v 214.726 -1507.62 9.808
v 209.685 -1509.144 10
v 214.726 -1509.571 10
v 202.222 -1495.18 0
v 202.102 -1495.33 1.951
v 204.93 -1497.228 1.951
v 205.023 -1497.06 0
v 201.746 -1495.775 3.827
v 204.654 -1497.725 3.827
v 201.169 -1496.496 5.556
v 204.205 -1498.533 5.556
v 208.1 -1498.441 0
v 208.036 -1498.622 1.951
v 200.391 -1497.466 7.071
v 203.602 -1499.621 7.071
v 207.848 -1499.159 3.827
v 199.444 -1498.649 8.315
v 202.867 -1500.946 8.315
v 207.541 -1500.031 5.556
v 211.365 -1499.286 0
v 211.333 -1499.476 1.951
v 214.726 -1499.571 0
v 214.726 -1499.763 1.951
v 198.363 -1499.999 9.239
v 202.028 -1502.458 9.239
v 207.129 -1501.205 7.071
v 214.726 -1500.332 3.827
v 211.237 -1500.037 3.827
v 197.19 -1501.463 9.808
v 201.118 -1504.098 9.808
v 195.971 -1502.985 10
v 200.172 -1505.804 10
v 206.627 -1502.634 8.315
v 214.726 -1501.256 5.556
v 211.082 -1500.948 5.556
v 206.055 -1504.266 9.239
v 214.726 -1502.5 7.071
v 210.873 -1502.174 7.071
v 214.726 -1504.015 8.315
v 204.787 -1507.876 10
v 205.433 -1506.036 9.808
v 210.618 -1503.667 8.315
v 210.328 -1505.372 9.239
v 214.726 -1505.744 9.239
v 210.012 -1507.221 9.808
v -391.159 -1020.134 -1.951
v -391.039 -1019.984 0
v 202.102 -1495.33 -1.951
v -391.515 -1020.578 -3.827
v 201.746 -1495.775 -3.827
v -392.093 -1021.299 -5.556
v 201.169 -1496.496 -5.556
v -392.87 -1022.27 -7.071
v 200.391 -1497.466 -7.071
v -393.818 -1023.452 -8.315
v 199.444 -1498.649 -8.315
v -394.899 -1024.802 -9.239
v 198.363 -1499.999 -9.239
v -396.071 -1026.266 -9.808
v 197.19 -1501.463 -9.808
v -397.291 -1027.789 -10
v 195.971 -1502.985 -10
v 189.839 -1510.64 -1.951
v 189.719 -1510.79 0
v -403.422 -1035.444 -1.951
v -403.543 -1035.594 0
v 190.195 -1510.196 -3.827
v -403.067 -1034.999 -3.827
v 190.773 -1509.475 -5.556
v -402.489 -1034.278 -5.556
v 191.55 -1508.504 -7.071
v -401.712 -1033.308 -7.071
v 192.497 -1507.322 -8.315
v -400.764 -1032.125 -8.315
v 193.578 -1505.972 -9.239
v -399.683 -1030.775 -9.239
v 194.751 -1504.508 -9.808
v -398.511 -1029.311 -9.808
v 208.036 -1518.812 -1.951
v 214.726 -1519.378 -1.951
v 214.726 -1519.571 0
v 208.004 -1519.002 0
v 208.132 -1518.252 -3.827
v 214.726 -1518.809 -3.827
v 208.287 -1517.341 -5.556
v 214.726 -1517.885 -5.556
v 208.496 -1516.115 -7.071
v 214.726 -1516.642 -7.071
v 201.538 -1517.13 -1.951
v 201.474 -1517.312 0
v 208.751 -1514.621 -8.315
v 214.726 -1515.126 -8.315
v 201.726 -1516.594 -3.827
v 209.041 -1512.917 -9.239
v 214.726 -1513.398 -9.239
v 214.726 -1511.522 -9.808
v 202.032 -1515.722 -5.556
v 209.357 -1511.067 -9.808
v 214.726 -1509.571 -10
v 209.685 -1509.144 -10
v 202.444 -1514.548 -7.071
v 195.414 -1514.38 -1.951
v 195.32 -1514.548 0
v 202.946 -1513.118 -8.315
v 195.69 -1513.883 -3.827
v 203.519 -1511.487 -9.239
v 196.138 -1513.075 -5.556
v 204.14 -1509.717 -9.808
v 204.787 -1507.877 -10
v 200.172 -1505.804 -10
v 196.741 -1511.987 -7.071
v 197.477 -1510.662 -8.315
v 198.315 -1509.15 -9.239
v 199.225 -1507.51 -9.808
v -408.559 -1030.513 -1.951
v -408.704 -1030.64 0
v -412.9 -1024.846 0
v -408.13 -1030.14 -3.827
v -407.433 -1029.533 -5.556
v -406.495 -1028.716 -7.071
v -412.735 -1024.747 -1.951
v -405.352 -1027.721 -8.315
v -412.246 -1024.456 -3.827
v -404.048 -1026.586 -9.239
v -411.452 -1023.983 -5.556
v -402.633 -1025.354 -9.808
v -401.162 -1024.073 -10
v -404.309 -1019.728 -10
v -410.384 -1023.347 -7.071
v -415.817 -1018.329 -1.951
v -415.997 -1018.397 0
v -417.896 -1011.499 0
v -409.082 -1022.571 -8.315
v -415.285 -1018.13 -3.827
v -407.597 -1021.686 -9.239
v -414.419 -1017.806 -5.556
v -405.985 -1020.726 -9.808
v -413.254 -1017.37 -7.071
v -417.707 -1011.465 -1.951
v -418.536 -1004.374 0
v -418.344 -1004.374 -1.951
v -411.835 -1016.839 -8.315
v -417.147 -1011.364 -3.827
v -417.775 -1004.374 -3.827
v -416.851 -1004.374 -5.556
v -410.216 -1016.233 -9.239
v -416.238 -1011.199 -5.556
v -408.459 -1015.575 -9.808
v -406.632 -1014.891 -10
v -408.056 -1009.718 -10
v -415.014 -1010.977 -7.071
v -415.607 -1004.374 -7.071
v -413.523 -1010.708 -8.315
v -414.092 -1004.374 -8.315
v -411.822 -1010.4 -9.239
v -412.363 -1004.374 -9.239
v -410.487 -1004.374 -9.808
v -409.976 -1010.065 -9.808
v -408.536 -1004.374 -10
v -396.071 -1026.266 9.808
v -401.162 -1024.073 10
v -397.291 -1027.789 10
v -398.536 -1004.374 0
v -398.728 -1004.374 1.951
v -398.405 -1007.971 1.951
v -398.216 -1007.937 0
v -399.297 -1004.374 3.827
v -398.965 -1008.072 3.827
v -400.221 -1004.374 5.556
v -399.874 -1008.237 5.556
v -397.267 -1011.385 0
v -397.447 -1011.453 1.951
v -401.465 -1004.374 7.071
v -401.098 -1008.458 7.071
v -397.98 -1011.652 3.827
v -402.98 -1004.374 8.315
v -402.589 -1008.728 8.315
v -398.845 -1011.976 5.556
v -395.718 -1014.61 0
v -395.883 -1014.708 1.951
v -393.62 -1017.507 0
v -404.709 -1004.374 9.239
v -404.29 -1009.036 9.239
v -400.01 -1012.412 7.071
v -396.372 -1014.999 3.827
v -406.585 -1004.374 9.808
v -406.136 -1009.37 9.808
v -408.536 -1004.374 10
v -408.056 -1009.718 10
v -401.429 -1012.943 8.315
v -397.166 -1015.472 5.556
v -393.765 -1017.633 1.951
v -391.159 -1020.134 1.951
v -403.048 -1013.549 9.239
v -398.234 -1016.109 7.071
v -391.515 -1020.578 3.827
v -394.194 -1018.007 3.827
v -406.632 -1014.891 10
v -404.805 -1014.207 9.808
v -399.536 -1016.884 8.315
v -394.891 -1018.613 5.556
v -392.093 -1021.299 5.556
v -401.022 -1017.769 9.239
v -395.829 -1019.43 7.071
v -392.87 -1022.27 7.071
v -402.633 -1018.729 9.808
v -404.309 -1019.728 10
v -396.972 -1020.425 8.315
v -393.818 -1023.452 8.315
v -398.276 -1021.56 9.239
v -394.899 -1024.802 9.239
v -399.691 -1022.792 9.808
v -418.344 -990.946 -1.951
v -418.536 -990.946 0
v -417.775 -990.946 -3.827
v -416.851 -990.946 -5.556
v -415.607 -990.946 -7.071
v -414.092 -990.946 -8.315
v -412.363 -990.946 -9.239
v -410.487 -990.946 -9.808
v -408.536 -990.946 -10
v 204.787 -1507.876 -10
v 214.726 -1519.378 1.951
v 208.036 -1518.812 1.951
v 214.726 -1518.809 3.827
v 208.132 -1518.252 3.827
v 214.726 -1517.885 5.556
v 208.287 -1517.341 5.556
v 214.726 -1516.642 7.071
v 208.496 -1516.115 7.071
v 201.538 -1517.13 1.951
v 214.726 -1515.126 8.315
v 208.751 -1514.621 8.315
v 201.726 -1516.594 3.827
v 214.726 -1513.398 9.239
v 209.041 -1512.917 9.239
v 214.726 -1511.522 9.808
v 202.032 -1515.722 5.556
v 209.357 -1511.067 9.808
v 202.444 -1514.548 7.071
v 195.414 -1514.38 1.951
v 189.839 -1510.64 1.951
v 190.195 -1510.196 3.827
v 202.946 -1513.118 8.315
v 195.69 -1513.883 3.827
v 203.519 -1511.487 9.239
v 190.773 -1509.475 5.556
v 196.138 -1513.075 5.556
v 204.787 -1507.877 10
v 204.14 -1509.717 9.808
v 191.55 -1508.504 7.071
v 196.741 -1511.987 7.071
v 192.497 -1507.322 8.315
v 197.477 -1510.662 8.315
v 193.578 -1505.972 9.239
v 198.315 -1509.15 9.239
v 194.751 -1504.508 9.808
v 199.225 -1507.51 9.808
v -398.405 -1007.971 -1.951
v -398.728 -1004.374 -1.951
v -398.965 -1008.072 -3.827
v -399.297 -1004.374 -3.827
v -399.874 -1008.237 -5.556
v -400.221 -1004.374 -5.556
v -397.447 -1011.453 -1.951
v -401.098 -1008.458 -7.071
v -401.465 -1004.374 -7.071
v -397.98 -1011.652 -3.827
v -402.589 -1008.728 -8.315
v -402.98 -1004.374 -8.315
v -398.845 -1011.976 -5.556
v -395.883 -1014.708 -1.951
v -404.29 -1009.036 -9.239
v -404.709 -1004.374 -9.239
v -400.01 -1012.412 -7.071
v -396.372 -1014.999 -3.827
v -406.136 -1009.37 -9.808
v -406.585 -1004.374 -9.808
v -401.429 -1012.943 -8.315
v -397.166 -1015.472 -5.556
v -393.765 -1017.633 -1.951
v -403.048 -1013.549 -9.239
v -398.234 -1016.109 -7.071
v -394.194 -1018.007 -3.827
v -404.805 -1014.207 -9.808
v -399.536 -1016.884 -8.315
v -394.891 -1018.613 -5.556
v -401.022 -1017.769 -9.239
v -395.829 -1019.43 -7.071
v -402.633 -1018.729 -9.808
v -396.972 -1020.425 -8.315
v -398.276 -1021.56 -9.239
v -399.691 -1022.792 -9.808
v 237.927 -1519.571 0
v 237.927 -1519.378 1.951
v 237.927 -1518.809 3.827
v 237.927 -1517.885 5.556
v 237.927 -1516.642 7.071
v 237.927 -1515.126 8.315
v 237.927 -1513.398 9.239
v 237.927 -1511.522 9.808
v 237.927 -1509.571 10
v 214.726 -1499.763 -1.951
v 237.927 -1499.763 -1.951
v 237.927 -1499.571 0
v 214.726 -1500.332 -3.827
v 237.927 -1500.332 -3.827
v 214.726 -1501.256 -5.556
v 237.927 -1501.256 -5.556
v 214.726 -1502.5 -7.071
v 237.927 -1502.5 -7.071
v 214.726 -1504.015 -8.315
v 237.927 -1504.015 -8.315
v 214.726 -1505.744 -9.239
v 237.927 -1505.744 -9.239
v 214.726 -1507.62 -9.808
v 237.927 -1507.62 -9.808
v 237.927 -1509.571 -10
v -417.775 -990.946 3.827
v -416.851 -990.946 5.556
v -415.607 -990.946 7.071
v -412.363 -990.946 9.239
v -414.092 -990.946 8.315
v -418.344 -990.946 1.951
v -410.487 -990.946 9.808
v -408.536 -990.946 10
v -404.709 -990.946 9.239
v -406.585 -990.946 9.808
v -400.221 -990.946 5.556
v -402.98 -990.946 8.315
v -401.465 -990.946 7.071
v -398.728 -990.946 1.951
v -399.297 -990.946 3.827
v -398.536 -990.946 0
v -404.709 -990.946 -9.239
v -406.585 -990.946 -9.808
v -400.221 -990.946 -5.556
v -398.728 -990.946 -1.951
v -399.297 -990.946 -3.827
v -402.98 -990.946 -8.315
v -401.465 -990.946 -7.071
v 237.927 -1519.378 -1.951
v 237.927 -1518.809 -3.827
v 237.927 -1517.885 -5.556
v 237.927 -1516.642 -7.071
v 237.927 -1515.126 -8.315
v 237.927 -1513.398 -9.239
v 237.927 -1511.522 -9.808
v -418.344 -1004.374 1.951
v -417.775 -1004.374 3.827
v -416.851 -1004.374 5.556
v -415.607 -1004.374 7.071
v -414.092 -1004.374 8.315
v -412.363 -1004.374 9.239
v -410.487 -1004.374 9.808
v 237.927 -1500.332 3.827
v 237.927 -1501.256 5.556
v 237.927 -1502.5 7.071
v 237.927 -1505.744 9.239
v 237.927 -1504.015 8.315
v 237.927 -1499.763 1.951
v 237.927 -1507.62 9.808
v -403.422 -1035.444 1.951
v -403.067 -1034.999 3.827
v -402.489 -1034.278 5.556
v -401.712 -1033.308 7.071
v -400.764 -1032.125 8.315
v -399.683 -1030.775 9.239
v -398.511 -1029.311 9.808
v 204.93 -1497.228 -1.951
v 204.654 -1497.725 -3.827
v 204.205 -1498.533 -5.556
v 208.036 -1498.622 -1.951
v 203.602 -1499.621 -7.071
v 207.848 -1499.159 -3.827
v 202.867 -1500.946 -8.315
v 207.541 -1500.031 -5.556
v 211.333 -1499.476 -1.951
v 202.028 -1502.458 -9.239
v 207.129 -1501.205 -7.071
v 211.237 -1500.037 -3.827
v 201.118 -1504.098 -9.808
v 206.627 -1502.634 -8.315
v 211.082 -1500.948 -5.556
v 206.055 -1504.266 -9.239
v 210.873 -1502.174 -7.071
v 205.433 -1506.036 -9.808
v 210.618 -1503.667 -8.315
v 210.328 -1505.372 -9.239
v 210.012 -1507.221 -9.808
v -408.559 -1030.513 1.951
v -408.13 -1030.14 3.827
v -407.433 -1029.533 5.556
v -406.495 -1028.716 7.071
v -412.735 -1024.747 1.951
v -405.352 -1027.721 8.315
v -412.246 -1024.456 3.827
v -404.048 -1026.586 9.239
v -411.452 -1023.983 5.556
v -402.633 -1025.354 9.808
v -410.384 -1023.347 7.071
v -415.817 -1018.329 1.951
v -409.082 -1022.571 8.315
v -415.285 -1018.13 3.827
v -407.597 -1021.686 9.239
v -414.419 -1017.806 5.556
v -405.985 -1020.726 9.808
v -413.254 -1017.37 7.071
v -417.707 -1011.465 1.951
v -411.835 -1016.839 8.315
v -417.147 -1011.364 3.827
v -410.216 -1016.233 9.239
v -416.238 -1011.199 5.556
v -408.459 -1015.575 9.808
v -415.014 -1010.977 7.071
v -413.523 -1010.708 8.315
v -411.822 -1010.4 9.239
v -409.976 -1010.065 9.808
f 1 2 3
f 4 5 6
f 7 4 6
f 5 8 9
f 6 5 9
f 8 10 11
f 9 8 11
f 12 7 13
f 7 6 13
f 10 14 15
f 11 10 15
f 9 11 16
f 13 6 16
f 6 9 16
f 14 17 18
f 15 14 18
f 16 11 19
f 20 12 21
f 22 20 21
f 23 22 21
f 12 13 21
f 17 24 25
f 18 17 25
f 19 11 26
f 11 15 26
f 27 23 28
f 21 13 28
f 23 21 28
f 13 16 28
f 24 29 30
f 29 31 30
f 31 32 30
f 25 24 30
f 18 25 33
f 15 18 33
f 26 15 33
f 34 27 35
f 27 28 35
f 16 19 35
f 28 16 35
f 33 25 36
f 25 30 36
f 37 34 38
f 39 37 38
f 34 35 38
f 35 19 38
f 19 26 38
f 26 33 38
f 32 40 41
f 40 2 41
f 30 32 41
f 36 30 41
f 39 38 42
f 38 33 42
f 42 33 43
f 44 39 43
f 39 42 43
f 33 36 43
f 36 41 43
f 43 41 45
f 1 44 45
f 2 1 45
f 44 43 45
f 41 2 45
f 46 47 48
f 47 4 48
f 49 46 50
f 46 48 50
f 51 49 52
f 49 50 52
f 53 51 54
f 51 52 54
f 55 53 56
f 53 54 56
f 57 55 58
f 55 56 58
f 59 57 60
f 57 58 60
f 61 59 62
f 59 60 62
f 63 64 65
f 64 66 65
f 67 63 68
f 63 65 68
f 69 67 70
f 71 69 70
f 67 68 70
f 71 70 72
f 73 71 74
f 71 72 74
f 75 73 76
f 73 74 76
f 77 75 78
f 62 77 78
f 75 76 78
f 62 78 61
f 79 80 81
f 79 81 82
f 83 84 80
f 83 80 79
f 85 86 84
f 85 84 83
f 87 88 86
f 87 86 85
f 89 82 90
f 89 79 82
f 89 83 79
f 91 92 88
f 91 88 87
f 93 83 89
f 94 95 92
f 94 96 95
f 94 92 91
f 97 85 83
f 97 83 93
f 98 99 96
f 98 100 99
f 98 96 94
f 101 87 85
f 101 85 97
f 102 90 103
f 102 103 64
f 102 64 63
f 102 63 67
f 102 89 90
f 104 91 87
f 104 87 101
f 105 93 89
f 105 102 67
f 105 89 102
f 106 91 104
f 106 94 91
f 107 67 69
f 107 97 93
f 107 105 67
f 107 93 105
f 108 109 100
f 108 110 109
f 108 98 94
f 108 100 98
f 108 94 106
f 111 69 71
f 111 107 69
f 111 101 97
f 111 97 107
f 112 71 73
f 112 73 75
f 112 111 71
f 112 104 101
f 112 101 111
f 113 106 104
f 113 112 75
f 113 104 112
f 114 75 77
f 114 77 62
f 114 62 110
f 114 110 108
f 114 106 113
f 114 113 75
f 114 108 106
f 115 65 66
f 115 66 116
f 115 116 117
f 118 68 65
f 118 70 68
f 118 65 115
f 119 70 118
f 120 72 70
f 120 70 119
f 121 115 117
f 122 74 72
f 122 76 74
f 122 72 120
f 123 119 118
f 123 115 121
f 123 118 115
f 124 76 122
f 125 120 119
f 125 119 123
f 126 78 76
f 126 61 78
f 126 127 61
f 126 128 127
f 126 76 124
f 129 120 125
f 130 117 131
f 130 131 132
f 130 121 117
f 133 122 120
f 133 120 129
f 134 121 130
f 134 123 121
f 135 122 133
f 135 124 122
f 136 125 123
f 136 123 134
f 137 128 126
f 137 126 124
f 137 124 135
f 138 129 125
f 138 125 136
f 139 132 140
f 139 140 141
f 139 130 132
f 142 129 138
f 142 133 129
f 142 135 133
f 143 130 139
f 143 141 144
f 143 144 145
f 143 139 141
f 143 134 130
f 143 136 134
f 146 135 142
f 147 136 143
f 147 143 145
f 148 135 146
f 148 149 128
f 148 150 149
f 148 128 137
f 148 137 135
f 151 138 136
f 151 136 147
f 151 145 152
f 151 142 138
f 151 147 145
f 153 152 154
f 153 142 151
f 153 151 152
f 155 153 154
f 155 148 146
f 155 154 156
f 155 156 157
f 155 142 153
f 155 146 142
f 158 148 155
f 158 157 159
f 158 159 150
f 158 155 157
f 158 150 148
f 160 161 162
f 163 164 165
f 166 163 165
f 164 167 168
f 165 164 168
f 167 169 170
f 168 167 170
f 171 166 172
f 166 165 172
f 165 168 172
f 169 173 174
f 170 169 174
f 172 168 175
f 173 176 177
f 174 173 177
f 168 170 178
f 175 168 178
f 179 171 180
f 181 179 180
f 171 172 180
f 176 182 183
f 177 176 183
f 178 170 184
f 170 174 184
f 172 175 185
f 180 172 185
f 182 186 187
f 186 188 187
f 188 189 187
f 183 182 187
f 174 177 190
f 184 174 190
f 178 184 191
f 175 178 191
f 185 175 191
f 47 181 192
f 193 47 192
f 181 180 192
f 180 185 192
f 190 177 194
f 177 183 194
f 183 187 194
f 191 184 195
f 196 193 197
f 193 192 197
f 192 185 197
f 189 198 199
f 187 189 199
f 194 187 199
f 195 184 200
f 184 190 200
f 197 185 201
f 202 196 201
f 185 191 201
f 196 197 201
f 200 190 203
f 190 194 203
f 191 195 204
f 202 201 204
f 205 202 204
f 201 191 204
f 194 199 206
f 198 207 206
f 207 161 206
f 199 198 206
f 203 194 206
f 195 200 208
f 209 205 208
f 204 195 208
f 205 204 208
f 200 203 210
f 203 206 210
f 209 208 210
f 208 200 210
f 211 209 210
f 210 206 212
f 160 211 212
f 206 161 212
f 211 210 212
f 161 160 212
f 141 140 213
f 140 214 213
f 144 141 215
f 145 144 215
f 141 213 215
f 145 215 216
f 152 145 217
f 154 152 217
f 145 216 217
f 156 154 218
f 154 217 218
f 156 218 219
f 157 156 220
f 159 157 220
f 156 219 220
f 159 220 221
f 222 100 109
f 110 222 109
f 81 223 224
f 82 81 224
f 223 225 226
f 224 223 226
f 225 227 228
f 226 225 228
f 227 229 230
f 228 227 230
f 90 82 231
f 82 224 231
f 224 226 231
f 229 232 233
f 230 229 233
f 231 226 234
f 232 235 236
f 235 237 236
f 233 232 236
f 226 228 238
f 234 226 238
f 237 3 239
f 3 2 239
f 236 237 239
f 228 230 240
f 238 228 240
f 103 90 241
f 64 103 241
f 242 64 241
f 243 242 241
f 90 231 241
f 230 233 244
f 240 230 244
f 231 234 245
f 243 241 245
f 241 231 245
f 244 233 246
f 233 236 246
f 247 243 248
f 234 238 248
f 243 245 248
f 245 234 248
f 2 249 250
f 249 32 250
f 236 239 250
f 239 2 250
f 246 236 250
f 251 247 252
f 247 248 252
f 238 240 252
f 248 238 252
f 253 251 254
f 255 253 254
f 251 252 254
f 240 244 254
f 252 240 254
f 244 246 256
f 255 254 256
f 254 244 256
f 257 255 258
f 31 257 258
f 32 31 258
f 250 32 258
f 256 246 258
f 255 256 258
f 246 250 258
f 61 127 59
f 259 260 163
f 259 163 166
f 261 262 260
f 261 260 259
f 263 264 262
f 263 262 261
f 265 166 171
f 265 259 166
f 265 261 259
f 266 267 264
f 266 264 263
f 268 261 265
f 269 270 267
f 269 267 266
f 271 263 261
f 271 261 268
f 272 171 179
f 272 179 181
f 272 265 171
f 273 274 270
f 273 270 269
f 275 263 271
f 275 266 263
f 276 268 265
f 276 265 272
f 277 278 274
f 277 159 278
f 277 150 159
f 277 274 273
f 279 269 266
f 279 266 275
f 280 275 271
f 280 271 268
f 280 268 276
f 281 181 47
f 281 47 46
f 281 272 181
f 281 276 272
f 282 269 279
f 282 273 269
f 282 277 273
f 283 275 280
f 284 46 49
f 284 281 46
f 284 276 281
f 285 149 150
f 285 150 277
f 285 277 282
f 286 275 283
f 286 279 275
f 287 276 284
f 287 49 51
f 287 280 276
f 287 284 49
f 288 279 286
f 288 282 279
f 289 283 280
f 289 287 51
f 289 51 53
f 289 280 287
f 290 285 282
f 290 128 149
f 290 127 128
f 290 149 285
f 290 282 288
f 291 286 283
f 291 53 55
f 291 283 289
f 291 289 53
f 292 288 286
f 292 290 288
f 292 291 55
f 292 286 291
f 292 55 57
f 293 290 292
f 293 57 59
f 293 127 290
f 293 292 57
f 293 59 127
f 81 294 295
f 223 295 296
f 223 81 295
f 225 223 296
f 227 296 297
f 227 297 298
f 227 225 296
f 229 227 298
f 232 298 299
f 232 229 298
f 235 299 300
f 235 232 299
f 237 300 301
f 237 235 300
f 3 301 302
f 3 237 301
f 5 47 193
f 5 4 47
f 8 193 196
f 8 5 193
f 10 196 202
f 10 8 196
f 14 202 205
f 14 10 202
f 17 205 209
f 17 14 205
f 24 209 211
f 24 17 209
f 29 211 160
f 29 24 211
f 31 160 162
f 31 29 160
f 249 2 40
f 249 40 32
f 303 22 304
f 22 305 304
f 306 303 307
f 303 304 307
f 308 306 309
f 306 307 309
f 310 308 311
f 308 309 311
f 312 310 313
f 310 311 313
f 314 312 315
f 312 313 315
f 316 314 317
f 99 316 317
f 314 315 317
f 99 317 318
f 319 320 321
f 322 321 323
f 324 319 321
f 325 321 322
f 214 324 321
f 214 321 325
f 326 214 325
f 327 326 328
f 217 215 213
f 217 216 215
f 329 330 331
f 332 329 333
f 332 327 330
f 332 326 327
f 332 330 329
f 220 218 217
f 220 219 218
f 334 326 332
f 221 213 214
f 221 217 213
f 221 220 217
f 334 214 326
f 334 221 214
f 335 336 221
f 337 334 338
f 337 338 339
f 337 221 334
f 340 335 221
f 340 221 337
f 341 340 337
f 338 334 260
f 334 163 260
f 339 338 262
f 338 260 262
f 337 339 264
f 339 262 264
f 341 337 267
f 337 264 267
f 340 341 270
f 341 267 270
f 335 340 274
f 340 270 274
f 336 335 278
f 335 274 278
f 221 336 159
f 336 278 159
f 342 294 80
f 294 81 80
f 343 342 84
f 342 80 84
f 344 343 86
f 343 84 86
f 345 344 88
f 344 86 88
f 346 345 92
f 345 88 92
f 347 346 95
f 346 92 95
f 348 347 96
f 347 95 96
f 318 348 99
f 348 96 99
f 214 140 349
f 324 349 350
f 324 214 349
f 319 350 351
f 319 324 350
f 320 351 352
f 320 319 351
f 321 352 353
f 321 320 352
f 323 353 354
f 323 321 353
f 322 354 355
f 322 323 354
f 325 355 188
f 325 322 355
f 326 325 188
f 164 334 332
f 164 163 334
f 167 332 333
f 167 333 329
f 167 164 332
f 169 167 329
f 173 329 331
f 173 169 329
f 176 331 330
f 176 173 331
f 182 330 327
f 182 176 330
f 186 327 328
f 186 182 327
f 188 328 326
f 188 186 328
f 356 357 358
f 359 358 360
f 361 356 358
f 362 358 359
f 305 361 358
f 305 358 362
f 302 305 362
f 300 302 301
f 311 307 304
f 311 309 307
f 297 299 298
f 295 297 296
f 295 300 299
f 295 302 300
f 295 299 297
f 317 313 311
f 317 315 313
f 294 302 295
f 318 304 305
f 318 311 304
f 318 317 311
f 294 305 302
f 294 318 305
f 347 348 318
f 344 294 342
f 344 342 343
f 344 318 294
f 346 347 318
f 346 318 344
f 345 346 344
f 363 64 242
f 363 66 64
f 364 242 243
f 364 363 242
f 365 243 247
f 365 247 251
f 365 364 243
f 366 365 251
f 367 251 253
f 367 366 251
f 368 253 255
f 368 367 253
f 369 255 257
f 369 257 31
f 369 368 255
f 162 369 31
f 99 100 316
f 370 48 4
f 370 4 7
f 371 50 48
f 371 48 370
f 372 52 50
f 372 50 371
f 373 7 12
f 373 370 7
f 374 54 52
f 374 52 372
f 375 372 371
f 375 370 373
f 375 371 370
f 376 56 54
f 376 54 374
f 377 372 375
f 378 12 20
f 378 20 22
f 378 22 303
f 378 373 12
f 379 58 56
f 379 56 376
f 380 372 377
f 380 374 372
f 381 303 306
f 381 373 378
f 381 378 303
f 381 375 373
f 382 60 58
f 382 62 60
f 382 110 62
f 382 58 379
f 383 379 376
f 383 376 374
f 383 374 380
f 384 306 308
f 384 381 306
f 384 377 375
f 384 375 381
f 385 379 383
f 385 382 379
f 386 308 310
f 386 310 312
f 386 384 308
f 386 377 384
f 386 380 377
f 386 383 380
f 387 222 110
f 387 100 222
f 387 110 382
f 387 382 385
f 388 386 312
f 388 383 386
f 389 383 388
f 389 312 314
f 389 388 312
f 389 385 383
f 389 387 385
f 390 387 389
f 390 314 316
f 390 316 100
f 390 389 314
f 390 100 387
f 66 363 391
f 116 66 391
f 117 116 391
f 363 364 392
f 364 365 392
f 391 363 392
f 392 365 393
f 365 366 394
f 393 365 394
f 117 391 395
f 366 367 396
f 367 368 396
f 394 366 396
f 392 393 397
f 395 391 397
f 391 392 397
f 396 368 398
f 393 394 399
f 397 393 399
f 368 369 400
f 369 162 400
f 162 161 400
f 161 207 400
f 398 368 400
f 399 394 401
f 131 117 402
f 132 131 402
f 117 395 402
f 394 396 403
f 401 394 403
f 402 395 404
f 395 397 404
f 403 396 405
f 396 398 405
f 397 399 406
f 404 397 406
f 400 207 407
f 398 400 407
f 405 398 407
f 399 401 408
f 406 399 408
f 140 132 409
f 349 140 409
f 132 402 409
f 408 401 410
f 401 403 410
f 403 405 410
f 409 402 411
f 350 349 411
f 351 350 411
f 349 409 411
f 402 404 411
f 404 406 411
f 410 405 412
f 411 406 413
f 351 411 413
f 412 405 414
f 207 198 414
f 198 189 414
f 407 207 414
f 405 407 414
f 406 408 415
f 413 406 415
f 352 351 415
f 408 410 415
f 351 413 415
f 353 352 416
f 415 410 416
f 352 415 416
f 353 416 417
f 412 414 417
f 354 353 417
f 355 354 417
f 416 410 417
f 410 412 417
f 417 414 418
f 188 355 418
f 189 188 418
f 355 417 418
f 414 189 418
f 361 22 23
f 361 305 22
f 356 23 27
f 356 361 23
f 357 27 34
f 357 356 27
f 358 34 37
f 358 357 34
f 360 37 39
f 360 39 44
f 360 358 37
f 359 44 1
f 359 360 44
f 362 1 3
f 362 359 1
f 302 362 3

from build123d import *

# Parameters (mm, degrees)
BOSS_EXTRUDE1_DEPTH      = 10
BOSS_EXTRUDE1_DEPTH_BACK = 10
FILLET1_R                = 10


with BuildPart() as part:
    # Sketch1 → Boss-Extrude1 (new, two sides: drawn at the far end of the back side and taken through both)
    with BuildSketch(Plane.XY.offset(-BOSS_EXTRUDE1_DEPTH_BACK)):
        with BuildLine():
            Line((237.926881338, -1499.570637215), (237.926881338, -1519.570637215))
            Line((237.926881338, -1519.570637215), (214.725572022, -1519.570637215))
            ThreePointArc((214.725572022, -1519.570637215), (201.473903455, -1517.311772335), (189.718921324, -1510.790301224))
            Line((189.718921324, -1510.790301224), (-403.542618158, -1035.59351223))
            ThreePointArc((-403.542618158, -1035.59351223), (-414.593324739, -1021.690516088), (-418.53596746, -1004.37384822))
            Line((-418.53596746, -1004.37384822), (-418.53596746, -990.945694684))
            Line((-418.53596746, -990.945694684), (-398.53596746, -990.945694684))
            Line((-398.53596746, -990.945694684), (-398.53596746, -1004.37384822))
            ThreePointArc((-398.53596746, -1004.37384822), (-396.5646461, -1013.032182154), (-391.039292809, -1019.983680225))
            Line((-391.039292809, -1019.983680225), (202.222246673, -1495.180469219))
            ThreePointArc((202.222246673, -1495.180469219), (208.099737738, -1498.441204775), (214.725572022, -1499.570637215))
            Line((214.725572022, -1499.570637215), (237.926881338, -1499.570637215))
        make_face()
    extrude(amount=BOSS_EXTRUDE1_DEPTH + BOSS_EXTRUDE1_DEPTH_BACK)

    # Fillet1
    fillet1_edges = [part.edges().sort_by_distance(p)[0] for p in [
        (226.32622668, -1499.570637215, -10),
        (208.099737738, -1498.441204775, -10),
        (-398.53596746, -997.659771452, -10),
        (-396.5646461, -1013.032182154, -10),
        (-418.53596746, -997.659771452, -10),
        (-414.593324739, -1021.690516088, -10),
        (226.32622668, -1519.570637215, -10),
        (201.473903455, -1517.311772335, -10),
        (226.32622668, -1499.570637215, 10),
        (208.099737738, -1498.441204775, 10),
        (-398.53596746, -997.659771452, 10),
        (-396.5646461, -1013.032182154, 10),
        (-418.53596746, -997.659771452, 10),
        (-414.593324739, -1021.690516088, 10),
        (226.32622668, -1519.570637215, 10),
        (201.473903455, -1517.311772335, 10),
        (-94.408523068, -1257.582074722, -10),
        (-106.911848417, -1273.191906727, -10),
        (-94.408523068, -1257.582074722, 10),
        (-106.911848417, -1273.191906727, 10),
    ]]
    fillet(fillet1_edges, radius=FILLET1_R - 0.0001)  # a hair under: the kernel refuses the full size


solid = part.part
